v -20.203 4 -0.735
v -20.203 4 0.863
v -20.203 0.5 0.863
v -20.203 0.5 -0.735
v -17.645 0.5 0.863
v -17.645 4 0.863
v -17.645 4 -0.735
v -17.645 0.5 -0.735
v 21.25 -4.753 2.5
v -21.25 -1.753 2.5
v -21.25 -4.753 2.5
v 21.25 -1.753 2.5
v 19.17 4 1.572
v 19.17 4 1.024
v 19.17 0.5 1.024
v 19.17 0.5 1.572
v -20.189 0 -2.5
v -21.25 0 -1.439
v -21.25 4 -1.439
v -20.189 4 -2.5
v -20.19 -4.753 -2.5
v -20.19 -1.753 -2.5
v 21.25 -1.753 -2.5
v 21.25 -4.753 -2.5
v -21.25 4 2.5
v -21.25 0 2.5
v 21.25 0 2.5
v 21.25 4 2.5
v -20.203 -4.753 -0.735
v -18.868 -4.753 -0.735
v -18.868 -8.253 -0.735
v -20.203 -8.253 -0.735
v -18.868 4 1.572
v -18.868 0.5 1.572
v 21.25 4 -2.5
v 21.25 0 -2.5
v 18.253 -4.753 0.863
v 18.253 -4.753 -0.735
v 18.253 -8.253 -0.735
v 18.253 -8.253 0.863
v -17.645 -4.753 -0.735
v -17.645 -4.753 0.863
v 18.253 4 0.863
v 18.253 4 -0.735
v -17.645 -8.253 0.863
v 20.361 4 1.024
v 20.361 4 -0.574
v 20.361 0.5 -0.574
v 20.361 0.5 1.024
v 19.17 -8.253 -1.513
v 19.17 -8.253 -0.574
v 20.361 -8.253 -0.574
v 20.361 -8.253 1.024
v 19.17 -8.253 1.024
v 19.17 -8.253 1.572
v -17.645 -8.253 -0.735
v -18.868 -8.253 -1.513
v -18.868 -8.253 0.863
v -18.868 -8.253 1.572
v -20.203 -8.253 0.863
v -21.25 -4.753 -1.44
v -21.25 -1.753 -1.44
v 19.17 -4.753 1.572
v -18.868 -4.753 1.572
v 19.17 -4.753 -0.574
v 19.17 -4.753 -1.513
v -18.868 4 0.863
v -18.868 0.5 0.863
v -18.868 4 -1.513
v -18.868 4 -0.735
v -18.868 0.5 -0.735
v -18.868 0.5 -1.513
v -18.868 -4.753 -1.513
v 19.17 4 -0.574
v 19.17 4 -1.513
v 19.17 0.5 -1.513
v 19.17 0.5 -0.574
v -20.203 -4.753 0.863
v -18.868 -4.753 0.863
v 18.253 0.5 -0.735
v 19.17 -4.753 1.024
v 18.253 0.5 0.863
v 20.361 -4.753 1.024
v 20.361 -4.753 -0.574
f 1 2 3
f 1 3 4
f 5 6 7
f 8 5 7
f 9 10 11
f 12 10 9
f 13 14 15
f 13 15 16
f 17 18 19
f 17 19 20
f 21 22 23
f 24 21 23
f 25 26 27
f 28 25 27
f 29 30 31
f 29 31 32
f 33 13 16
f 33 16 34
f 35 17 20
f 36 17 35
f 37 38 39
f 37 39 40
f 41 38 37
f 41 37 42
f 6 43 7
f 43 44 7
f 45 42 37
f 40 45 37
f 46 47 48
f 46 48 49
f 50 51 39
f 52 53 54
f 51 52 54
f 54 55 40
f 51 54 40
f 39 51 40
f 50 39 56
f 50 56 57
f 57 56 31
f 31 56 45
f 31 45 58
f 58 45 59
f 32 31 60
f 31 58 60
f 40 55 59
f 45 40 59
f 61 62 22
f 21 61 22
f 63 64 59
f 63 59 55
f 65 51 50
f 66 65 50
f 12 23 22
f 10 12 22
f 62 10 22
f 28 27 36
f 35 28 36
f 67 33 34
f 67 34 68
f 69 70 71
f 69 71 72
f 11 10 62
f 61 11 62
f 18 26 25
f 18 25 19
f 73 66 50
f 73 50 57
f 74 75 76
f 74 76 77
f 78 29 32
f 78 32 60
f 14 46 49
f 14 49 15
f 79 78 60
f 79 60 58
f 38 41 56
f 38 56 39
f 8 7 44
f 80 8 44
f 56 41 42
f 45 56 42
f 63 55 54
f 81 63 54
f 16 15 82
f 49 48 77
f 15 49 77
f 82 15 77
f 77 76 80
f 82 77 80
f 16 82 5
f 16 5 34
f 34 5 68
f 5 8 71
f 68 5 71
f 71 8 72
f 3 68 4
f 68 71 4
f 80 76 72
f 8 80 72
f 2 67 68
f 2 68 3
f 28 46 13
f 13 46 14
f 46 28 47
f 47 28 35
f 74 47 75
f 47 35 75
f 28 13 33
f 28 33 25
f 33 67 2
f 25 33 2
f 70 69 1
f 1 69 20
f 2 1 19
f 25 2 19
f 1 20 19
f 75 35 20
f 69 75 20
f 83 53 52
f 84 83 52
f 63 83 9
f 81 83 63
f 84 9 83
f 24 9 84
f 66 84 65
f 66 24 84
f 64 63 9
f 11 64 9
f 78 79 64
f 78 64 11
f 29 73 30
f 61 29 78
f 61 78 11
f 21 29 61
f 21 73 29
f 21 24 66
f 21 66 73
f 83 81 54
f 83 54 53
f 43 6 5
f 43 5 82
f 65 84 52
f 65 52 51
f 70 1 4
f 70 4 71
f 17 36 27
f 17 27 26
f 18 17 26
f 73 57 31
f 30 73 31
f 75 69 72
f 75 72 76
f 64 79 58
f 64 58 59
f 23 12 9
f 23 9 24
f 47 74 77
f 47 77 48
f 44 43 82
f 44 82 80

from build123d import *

# Parameters (mm, degrees)
SV_DEPTH           = 4
SKETCH3_W          = 35.897762959
SKETCH3_H          = 1.597828601
CUT_EXTRUDE1_DEPTH = 3.5
SV2_A_DEPTH        = 3
SKETCH7_W          = 35.897762959
SKETCH7_H          = 1.597828601
SV2_B_DEPTH        = 3.5


with BuildPart() as part:
    # Sketch1 → SV (new body)
    with BuildSketch(Plane(origin=(0, 0, 0), x_dir=(1, 0, 0), z_dir=(0, 1, 0))):
        Polygon((-20.189, 2.5), (21.25, 2.5), (21.25, -1.44), (21.25, -2.5), (20.19, -2.5), (-21.25, -2.5), (-21.25, 1.439), align=None)
    extrude(amount=SV_DEPTH)

    # Sketch3 → Cut-Extrude1 (cut)
    with BuildSketch(Plane(origin=(0, 4, 0), x_dir=(1, 0, 0), z_dir=(0, 1, 0))):
        Polygon((-20.202517392, 0.734832739), (-18.867516597, 0.734832739), (-18.867516597, 1.51327079), (19.169882457, 1.51327079), (19.169882457, 0.573528463), (20.36118295, 0.573528463), (20.36118295, -1.024300139), (19.169882457, -1.024300139), (19.169882457, -1.572342426), (-18.867516597, -1.572342426), (-18.867516597, -0.862995862), (-20.202517392, -0.862995862), align=None)
        with Locations((0.304154287, -0.064081561)):
            Rectangle(SKETCH3_W, SKETCH3_H, mode=Mode.SUBTRACT)
    extrude(amount=-CUT_EXTRUDE1_DEPTH, mode=Mode.SUBTRACT)


with BuildPart() as body_2:
    # Sketch6 → SV2(a) (new body)
    with BuildSketch(Plane(origin=(0, -1.7526, 0), x_dir=(1, 0, 0), z_dir=(0, 1, 0))):
        Polygon((21.25, -1.43808395), (21.25, -2.5), (20.18808395, -2.5), (-21.25, -2.5), (-21.25, 1.44), (-20.19, 2.5), (21.25, 2.5), align=None)
    extrude(amount=-SV2_A_DEPTH)

    # Sketch7 → SV2(b) (add)
    with BuildSketch(Plane.XZ.offset(4.7526)):
        Polygon((-18.867516597, -1.51327079), (-18.867516597, -0.734832739), (-20.202517392, -0.734832739), (-20.202517392, 0.862995862), (-18.867516597, 0.862995862), (-18.867516597, 1.572342426), (19.169882457, 1.572342426), (19.169882457, 1.024300139), (20.36118295, 1.024300139), (20.36118295, -0.573528463), (19.169882457, -0.573528463), (19.169882457, -1.51327079), align=None)
        with Locations((0.304154287, 0.064081561)):
            Rectangle(SKETCH7_W, SKETCH7_H, mode=Mode.SUBTRACT)
    extrude(amount=SV2_B_DEPTH)


solid = Compound([part.part, body_2.part])
